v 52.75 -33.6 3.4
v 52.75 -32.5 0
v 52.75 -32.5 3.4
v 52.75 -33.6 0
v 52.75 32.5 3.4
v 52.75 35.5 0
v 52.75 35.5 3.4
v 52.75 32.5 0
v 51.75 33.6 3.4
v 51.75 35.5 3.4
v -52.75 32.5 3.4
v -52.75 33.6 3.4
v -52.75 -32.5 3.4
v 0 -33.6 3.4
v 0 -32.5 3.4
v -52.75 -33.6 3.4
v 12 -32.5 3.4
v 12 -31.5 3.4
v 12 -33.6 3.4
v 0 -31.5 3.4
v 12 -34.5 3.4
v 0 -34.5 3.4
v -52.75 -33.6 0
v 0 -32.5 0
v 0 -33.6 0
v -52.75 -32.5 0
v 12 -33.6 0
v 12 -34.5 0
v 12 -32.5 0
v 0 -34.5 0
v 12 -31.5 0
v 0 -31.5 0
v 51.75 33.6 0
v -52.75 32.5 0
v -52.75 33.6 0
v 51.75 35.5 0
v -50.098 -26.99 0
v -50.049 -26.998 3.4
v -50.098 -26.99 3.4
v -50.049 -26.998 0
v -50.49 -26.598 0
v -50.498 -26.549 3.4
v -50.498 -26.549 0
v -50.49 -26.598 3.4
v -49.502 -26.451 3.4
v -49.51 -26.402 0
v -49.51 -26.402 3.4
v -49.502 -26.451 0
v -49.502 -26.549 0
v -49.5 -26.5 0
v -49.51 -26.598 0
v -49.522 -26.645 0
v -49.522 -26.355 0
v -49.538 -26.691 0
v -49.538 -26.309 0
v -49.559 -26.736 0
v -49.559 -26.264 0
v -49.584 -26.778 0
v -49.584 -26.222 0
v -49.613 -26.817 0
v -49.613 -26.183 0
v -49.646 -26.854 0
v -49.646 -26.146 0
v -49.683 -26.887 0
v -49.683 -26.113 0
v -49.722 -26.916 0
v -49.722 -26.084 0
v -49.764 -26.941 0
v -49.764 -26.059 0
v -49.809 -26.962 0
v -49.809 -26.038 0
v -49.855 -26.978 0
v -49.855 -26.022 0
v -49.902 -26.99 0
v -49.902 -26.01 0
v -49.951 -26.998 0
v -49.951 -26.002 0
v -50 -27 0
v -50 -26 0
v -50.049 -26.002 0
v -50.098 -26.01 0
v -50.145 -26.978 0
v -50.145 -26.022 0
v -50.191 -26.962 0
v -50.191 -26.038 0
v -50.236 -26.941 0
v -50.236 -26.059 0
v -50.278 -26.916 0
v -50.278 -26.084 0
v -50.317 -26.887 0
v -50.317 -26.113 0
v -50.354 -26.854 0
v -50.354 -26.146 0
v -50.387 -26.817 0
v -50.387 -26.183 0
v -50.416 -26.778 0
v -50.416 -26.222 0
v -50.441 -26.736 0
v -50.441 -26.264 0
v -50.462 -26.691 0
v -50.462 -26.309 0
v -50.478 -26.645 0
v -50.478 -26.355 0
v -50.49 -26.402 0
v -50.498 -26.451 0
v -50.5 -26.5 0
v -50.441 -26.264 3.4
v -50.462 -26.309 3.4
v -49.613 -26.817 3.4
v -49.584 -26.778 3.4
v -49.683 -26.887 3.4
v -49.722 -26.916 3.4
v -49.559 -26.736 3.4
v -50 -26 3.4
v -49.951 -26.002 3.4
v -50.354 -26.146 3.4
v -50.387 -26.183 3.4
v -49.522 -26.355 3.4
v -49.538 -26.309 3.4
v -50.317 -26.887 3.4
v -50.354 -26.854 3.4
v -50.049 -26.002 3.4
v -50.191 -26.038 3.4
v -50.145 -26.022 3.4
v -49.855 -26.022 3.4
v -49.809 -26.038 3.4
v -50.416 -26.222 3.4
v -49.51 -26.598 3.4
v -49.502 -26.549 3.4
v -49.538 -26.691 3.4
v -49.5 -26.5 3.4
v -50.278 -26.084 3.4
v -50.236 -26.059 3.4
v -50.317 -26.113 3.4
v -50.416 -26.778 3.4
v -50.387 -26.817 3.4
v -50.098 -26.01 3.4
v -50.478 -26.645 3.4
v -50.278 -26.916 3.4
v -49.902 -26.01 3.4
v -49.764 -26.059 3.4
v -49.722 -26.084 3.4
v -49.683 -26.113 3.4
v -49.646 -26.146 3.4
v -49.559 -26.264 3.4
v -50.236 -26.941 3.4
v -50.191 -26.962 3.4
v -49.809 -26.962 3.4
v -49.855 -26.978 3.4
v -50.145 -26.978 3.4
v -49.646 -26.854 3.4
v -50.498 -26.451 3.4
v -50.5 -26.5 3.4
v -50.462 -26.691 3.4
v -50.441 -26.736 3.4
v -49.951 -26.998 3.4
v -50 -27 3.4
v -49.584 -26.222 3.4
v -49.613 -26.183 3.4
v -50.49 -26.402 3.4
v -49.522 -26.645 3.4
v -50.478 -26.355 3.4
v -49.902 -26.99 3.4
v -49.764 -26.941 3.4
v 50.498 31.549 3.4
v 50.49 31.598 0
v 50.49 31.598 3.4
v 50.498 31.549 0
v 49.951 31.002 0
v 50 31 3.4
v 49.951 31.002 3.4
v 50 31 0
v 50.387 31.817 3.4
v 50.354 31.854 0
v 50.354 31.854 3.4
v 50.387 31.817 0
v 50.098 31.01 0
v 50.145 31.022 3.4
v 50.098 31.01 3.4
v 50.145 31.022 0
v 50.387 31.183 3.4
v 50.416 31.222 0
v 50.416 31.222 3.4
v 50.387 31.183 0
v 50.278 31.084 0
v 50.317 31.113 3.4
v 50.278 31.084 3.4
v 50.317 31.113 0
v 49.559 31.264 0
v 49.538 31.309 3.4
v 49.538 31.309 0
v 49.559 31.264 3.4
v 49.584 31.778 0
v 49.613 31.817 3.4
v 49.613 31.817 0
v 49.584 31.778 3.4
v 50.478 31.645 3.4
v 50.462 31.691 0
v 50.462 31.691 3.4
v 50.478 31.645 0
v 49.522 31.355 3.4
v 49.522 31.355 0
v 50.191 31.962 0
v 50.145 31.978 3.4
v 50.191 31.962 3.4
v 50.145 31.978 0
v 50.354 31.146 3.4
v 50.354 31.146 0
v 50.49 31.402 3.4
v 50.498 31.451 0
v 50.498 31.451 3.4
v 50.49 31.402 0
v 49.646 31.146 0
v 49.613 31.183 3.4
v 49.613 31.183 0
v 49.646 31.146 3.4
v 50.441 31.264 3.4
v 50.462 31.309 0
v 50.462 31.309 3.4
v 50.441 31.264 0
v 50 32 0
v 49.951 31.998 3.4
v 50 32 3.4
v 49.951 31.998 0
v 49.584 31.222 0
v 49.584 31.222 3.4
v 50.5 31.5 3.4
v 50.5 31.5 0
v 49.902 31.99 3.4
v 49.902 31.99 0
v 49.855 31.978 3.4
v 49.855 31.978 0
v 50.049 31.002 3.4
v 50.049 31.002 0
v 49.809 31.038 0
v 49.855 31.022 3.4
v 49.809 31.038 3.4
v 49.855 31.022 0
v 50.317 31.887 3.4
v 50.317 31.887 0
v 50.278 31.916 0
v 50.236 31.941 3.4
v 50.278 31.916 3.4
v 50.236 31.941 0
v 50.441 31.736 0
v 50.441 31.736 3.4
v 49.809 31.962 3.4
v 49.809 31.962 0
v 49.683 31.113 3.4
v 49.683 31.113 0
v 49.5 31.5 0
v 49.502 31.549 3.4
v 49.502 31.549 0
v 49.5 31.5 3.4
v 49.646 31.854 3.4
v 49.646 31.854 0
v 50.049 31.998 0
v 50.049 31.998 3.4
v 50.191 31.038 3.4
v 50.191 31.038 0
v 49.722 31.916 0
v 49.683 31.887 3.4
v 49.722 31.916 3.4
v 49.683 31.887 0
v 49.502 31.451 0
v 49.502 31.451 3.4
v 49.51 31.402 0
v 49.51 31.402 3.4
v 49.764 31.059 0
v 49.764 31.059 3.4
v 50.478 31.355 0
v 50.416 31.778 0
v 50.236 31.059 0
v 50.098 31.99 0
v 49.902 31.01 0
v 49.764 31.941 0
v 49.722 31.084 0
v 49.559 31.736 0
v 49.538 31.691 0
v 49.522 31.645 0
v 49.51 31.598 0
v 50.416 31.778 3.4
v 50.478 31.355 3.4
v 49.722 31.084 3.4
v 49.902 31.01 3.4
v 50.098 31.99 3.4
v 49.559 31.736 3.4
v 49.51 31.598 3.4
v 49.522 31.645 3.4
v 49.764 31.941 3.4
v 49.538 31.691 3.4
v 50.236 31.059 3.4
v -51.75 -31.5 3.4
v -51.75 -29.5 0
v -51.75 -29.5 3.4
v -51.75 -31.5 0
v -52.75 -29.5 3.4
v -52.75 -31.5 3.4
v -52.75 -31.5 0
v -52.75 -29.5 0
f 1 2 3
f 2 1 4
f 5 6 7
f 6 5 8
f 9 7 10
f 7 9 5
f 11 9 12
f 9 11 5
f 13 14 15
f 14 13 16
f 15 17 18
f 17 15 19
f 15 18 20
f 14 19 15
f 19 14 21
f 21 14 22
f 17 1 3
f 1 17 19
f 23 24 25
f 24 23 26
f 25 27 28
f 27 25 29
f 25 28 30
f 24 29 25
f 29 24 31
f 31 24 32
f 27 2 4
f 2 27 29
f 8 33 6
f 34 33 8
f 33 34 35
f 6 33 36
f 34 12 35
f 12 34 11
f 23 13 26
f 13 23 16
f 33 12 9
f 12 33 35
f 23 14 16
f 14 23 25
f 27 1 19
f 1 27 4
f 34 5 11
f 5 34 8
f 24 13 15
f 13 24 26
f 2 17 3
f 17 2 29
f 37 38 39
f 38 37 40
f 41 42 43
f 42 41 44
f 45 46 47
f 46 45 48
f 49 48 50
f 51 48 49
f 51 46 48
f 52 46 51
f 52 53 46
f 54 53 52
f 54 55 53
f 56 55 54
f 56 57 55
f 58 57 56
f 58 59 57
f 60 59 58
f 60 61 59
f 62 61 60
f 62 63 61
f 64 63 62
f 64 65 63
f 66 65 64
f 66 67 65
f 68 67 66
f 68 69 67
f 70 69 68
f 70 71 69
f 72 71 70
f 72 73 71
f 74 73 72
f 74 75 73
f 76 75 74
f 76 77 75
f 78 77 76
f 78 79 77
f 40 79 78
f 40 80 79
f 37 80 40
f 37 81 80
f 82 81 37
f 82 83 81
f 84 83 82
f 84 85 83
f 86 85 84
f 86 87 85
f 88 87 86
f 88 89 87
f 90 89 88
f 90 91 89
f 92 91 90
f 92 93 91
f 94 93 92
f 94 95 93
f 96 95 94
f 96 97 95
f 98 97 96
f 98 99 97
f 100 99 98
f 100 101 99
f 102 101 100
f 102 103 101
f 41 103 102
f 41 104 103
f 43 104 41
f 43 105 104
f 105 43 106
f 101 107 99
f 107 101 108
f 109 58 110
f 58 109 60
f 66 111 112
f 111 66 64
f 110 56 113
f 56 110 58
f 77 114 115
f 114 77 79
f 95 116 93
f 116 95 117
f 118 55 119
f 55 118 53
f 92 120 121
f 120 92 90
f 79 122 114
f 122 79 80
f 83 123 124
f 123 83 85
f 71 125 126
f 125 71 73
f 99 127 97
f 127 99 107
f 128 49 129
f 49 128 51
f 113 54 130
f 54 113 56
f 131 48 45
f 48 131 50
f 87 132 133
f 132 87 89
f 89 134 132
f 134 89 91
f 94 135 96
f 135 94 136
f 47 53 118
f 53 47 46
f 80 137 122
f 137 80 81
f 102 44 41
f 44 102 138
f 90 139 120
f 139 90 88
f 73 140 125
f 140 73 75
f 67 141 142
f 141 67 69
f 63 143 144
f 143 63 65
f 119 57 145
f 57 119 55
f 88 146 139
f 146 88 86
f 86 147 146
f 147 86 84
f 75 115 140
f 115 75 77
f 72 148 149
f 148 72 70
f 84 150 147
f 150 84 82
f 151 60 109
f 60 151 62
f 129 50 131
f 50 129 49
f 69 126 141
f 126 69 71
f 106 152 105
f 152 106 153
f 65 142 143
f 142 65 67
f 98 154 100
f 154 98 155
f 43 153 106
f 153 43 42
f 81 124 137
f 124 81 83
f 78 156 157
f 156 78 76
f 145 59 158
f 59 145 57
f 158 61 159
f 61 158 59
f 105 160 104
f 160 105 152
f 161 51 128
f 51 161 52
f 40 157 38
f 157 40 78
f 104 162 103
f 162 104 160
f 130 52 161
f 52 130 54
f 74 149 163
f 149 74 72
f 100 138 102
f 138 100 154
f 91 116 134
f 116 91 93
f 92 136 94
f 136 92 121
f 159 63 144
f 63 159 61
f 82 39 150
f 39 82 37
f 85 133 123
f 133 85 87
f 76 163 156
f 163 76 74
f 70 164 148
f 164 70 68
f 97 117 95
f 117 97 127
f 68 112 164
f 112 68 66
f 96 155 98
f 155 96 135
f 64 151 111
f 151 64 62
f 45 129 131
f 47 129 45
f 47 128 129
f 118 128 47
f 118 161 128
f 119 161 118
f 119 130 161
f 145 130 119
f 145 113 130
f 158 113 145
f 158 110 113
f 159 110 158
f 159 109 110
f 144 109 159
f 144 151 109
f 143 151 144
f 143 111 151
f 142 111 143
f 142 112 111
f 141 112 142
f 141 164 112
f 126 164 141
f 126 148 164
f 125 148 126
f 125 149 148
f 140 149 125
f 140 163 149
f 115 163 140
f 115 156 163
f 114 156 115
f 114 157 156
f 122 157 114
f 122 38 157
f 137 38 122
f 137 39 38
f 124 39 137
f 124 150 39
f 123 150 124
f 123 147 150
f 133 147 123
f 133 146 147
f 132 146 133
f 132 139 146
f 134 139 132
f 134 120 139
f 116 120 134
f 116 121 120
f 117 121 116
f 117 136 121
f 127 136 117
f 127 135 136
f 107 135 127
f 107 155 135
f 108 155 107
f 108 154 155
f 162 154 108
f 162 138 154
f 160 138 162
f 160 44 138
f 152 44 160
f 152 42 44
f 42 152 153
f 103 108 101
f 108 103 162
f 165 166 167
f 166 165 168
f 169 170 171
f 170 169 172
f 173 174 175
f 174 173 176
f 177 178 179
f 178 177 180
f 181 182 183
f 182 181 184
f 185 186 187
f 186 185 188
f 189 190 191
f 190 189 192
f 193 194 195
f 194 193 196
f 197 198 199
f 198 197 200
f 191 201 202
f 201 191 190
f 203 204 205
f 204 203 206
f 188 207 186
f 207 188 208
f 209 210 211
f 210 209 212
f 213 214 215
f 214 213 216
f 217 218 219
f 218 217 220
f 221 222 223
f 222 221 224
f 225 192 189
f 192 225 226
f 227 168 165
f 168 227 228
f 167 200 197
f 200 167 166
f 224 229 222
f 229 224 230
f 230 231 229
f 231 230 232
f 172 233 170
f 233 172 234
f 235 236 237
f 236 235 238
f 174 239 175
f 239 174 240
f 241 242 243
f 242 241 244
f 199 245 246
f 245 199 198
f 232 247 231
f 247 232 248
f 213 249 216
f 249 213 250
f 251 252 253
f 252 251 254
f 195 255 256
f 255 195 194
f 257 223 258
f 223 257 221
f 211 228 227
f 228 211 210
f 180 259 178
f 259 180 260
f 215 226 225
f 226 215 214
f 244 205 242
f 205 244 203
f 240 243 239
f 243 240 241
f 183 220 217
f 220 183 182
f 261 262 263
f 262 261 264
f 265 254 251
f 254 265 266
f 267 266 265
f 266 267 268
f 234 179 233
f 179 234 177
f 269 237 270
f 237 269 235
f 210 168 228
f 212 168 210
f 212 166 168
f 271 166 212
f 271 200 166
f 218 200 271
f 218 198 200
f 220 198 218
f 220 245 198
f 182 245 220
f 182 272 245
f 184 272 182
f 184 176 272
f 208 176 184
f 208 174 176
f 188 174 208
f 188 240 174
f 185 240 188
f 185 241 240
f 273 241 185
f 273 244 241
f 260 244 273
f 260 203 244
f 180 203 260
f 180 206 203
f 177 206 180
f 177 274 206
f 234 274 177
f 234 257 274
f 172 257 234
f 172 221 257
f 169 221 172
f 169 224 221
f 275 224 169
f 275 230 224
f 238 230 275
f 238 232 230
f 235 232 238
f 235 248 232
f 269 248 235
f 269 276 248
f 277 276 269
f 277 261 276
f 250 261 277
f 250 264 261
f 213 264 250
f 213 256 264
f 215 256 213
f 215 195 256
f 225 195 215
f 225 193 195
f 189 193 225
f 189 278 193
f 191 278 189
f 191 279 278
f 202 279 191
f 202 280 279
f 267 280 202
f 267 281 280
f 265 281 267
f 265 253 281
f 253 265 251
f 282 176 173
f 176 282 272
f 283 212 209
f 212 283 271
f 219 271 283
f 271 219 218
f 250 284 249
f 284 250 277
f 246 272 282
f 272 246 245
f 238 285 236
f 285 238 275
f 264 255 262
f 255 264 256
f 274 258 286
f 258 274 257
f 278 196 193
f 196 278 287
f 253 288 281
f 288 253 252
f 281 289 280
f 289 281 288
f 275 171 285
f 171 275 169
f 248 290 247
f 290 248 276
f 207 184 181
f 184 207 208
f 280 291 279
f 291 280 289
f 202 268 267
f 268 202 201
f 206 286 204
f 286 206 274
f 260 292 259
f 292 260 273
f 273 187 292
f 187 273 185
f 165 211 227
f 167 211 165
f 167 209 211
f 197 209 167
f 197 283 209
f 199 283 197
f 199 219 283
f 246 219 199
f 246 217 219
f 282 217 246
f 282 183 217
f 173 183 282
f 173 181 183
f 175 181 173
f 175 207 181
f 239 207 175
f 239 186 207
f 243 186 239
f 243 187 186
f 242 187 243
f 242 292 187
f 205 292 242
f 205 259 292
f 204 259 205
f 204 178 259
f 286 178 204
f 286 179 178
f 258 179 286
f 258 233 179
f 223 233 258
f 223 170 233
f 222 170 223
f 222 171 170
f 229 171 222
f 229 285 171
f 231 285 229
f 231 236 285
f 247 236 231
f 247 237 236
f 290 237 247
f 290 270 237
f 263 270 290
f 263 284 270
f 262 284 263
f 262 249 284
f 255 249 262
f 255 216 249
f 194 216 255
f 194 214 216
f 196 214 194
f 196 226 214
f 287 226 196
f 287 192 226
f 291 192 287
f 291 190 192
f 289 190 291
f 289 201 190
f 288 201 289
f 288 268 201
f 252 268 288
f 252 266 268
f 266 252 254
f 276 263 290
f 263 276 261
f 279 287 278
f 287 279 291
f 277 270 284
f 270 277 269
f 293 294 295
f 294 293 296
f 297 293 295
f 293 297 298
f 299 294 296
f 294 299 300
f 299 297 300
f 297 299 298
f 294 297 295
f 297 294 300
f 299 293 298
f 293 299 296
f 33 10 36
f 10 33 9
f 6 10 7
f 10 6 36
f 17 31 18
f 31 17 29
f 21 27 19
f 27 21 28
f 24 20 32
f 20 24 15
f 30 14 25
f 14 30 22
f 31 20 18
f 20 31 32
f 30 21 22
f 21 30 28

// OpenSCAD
module lcd_display() {
    difference() {
        // Main body of the display
        translate([0, 0, 1.7])
            cube([105.5, 67.2, 3.4], center=true);
        
        // Cutout for the screen
        translate([0, 0, 1.7])
            cube([105.5, 65, 3.4], center=true);
    }
}

module mounting_holes() {
    // Define mounting holes
    translate([-50, -26.5, 0])
        cylinder(h=3.4, r=0.5, $fn=64);
    translate([50, 31.5, 0])
        cylinder(h=3.4, r=0.5, $fn=64);
}

module connectors() {
    // Define connectors
    translate([-105.5 / 2, -65 / 2 + 1, 0])
        cube([1, 2, 3.4], center=false);
    translate([105.5 / 2 - 1, 65 / 2 + 1, 0])
        cube([1, 2, 3.4], center=false);
}

module button_cutouts() {
    // Define button cutouts
    translate([0, -34.5, 0])
        cube([12, 3, 3.4], center=false);
}

module display_assembly() {
    union() {
        lcd_display();
        mounting_holes();
        connectors();
        button_cutouts();
    }
}

display_assembly();
